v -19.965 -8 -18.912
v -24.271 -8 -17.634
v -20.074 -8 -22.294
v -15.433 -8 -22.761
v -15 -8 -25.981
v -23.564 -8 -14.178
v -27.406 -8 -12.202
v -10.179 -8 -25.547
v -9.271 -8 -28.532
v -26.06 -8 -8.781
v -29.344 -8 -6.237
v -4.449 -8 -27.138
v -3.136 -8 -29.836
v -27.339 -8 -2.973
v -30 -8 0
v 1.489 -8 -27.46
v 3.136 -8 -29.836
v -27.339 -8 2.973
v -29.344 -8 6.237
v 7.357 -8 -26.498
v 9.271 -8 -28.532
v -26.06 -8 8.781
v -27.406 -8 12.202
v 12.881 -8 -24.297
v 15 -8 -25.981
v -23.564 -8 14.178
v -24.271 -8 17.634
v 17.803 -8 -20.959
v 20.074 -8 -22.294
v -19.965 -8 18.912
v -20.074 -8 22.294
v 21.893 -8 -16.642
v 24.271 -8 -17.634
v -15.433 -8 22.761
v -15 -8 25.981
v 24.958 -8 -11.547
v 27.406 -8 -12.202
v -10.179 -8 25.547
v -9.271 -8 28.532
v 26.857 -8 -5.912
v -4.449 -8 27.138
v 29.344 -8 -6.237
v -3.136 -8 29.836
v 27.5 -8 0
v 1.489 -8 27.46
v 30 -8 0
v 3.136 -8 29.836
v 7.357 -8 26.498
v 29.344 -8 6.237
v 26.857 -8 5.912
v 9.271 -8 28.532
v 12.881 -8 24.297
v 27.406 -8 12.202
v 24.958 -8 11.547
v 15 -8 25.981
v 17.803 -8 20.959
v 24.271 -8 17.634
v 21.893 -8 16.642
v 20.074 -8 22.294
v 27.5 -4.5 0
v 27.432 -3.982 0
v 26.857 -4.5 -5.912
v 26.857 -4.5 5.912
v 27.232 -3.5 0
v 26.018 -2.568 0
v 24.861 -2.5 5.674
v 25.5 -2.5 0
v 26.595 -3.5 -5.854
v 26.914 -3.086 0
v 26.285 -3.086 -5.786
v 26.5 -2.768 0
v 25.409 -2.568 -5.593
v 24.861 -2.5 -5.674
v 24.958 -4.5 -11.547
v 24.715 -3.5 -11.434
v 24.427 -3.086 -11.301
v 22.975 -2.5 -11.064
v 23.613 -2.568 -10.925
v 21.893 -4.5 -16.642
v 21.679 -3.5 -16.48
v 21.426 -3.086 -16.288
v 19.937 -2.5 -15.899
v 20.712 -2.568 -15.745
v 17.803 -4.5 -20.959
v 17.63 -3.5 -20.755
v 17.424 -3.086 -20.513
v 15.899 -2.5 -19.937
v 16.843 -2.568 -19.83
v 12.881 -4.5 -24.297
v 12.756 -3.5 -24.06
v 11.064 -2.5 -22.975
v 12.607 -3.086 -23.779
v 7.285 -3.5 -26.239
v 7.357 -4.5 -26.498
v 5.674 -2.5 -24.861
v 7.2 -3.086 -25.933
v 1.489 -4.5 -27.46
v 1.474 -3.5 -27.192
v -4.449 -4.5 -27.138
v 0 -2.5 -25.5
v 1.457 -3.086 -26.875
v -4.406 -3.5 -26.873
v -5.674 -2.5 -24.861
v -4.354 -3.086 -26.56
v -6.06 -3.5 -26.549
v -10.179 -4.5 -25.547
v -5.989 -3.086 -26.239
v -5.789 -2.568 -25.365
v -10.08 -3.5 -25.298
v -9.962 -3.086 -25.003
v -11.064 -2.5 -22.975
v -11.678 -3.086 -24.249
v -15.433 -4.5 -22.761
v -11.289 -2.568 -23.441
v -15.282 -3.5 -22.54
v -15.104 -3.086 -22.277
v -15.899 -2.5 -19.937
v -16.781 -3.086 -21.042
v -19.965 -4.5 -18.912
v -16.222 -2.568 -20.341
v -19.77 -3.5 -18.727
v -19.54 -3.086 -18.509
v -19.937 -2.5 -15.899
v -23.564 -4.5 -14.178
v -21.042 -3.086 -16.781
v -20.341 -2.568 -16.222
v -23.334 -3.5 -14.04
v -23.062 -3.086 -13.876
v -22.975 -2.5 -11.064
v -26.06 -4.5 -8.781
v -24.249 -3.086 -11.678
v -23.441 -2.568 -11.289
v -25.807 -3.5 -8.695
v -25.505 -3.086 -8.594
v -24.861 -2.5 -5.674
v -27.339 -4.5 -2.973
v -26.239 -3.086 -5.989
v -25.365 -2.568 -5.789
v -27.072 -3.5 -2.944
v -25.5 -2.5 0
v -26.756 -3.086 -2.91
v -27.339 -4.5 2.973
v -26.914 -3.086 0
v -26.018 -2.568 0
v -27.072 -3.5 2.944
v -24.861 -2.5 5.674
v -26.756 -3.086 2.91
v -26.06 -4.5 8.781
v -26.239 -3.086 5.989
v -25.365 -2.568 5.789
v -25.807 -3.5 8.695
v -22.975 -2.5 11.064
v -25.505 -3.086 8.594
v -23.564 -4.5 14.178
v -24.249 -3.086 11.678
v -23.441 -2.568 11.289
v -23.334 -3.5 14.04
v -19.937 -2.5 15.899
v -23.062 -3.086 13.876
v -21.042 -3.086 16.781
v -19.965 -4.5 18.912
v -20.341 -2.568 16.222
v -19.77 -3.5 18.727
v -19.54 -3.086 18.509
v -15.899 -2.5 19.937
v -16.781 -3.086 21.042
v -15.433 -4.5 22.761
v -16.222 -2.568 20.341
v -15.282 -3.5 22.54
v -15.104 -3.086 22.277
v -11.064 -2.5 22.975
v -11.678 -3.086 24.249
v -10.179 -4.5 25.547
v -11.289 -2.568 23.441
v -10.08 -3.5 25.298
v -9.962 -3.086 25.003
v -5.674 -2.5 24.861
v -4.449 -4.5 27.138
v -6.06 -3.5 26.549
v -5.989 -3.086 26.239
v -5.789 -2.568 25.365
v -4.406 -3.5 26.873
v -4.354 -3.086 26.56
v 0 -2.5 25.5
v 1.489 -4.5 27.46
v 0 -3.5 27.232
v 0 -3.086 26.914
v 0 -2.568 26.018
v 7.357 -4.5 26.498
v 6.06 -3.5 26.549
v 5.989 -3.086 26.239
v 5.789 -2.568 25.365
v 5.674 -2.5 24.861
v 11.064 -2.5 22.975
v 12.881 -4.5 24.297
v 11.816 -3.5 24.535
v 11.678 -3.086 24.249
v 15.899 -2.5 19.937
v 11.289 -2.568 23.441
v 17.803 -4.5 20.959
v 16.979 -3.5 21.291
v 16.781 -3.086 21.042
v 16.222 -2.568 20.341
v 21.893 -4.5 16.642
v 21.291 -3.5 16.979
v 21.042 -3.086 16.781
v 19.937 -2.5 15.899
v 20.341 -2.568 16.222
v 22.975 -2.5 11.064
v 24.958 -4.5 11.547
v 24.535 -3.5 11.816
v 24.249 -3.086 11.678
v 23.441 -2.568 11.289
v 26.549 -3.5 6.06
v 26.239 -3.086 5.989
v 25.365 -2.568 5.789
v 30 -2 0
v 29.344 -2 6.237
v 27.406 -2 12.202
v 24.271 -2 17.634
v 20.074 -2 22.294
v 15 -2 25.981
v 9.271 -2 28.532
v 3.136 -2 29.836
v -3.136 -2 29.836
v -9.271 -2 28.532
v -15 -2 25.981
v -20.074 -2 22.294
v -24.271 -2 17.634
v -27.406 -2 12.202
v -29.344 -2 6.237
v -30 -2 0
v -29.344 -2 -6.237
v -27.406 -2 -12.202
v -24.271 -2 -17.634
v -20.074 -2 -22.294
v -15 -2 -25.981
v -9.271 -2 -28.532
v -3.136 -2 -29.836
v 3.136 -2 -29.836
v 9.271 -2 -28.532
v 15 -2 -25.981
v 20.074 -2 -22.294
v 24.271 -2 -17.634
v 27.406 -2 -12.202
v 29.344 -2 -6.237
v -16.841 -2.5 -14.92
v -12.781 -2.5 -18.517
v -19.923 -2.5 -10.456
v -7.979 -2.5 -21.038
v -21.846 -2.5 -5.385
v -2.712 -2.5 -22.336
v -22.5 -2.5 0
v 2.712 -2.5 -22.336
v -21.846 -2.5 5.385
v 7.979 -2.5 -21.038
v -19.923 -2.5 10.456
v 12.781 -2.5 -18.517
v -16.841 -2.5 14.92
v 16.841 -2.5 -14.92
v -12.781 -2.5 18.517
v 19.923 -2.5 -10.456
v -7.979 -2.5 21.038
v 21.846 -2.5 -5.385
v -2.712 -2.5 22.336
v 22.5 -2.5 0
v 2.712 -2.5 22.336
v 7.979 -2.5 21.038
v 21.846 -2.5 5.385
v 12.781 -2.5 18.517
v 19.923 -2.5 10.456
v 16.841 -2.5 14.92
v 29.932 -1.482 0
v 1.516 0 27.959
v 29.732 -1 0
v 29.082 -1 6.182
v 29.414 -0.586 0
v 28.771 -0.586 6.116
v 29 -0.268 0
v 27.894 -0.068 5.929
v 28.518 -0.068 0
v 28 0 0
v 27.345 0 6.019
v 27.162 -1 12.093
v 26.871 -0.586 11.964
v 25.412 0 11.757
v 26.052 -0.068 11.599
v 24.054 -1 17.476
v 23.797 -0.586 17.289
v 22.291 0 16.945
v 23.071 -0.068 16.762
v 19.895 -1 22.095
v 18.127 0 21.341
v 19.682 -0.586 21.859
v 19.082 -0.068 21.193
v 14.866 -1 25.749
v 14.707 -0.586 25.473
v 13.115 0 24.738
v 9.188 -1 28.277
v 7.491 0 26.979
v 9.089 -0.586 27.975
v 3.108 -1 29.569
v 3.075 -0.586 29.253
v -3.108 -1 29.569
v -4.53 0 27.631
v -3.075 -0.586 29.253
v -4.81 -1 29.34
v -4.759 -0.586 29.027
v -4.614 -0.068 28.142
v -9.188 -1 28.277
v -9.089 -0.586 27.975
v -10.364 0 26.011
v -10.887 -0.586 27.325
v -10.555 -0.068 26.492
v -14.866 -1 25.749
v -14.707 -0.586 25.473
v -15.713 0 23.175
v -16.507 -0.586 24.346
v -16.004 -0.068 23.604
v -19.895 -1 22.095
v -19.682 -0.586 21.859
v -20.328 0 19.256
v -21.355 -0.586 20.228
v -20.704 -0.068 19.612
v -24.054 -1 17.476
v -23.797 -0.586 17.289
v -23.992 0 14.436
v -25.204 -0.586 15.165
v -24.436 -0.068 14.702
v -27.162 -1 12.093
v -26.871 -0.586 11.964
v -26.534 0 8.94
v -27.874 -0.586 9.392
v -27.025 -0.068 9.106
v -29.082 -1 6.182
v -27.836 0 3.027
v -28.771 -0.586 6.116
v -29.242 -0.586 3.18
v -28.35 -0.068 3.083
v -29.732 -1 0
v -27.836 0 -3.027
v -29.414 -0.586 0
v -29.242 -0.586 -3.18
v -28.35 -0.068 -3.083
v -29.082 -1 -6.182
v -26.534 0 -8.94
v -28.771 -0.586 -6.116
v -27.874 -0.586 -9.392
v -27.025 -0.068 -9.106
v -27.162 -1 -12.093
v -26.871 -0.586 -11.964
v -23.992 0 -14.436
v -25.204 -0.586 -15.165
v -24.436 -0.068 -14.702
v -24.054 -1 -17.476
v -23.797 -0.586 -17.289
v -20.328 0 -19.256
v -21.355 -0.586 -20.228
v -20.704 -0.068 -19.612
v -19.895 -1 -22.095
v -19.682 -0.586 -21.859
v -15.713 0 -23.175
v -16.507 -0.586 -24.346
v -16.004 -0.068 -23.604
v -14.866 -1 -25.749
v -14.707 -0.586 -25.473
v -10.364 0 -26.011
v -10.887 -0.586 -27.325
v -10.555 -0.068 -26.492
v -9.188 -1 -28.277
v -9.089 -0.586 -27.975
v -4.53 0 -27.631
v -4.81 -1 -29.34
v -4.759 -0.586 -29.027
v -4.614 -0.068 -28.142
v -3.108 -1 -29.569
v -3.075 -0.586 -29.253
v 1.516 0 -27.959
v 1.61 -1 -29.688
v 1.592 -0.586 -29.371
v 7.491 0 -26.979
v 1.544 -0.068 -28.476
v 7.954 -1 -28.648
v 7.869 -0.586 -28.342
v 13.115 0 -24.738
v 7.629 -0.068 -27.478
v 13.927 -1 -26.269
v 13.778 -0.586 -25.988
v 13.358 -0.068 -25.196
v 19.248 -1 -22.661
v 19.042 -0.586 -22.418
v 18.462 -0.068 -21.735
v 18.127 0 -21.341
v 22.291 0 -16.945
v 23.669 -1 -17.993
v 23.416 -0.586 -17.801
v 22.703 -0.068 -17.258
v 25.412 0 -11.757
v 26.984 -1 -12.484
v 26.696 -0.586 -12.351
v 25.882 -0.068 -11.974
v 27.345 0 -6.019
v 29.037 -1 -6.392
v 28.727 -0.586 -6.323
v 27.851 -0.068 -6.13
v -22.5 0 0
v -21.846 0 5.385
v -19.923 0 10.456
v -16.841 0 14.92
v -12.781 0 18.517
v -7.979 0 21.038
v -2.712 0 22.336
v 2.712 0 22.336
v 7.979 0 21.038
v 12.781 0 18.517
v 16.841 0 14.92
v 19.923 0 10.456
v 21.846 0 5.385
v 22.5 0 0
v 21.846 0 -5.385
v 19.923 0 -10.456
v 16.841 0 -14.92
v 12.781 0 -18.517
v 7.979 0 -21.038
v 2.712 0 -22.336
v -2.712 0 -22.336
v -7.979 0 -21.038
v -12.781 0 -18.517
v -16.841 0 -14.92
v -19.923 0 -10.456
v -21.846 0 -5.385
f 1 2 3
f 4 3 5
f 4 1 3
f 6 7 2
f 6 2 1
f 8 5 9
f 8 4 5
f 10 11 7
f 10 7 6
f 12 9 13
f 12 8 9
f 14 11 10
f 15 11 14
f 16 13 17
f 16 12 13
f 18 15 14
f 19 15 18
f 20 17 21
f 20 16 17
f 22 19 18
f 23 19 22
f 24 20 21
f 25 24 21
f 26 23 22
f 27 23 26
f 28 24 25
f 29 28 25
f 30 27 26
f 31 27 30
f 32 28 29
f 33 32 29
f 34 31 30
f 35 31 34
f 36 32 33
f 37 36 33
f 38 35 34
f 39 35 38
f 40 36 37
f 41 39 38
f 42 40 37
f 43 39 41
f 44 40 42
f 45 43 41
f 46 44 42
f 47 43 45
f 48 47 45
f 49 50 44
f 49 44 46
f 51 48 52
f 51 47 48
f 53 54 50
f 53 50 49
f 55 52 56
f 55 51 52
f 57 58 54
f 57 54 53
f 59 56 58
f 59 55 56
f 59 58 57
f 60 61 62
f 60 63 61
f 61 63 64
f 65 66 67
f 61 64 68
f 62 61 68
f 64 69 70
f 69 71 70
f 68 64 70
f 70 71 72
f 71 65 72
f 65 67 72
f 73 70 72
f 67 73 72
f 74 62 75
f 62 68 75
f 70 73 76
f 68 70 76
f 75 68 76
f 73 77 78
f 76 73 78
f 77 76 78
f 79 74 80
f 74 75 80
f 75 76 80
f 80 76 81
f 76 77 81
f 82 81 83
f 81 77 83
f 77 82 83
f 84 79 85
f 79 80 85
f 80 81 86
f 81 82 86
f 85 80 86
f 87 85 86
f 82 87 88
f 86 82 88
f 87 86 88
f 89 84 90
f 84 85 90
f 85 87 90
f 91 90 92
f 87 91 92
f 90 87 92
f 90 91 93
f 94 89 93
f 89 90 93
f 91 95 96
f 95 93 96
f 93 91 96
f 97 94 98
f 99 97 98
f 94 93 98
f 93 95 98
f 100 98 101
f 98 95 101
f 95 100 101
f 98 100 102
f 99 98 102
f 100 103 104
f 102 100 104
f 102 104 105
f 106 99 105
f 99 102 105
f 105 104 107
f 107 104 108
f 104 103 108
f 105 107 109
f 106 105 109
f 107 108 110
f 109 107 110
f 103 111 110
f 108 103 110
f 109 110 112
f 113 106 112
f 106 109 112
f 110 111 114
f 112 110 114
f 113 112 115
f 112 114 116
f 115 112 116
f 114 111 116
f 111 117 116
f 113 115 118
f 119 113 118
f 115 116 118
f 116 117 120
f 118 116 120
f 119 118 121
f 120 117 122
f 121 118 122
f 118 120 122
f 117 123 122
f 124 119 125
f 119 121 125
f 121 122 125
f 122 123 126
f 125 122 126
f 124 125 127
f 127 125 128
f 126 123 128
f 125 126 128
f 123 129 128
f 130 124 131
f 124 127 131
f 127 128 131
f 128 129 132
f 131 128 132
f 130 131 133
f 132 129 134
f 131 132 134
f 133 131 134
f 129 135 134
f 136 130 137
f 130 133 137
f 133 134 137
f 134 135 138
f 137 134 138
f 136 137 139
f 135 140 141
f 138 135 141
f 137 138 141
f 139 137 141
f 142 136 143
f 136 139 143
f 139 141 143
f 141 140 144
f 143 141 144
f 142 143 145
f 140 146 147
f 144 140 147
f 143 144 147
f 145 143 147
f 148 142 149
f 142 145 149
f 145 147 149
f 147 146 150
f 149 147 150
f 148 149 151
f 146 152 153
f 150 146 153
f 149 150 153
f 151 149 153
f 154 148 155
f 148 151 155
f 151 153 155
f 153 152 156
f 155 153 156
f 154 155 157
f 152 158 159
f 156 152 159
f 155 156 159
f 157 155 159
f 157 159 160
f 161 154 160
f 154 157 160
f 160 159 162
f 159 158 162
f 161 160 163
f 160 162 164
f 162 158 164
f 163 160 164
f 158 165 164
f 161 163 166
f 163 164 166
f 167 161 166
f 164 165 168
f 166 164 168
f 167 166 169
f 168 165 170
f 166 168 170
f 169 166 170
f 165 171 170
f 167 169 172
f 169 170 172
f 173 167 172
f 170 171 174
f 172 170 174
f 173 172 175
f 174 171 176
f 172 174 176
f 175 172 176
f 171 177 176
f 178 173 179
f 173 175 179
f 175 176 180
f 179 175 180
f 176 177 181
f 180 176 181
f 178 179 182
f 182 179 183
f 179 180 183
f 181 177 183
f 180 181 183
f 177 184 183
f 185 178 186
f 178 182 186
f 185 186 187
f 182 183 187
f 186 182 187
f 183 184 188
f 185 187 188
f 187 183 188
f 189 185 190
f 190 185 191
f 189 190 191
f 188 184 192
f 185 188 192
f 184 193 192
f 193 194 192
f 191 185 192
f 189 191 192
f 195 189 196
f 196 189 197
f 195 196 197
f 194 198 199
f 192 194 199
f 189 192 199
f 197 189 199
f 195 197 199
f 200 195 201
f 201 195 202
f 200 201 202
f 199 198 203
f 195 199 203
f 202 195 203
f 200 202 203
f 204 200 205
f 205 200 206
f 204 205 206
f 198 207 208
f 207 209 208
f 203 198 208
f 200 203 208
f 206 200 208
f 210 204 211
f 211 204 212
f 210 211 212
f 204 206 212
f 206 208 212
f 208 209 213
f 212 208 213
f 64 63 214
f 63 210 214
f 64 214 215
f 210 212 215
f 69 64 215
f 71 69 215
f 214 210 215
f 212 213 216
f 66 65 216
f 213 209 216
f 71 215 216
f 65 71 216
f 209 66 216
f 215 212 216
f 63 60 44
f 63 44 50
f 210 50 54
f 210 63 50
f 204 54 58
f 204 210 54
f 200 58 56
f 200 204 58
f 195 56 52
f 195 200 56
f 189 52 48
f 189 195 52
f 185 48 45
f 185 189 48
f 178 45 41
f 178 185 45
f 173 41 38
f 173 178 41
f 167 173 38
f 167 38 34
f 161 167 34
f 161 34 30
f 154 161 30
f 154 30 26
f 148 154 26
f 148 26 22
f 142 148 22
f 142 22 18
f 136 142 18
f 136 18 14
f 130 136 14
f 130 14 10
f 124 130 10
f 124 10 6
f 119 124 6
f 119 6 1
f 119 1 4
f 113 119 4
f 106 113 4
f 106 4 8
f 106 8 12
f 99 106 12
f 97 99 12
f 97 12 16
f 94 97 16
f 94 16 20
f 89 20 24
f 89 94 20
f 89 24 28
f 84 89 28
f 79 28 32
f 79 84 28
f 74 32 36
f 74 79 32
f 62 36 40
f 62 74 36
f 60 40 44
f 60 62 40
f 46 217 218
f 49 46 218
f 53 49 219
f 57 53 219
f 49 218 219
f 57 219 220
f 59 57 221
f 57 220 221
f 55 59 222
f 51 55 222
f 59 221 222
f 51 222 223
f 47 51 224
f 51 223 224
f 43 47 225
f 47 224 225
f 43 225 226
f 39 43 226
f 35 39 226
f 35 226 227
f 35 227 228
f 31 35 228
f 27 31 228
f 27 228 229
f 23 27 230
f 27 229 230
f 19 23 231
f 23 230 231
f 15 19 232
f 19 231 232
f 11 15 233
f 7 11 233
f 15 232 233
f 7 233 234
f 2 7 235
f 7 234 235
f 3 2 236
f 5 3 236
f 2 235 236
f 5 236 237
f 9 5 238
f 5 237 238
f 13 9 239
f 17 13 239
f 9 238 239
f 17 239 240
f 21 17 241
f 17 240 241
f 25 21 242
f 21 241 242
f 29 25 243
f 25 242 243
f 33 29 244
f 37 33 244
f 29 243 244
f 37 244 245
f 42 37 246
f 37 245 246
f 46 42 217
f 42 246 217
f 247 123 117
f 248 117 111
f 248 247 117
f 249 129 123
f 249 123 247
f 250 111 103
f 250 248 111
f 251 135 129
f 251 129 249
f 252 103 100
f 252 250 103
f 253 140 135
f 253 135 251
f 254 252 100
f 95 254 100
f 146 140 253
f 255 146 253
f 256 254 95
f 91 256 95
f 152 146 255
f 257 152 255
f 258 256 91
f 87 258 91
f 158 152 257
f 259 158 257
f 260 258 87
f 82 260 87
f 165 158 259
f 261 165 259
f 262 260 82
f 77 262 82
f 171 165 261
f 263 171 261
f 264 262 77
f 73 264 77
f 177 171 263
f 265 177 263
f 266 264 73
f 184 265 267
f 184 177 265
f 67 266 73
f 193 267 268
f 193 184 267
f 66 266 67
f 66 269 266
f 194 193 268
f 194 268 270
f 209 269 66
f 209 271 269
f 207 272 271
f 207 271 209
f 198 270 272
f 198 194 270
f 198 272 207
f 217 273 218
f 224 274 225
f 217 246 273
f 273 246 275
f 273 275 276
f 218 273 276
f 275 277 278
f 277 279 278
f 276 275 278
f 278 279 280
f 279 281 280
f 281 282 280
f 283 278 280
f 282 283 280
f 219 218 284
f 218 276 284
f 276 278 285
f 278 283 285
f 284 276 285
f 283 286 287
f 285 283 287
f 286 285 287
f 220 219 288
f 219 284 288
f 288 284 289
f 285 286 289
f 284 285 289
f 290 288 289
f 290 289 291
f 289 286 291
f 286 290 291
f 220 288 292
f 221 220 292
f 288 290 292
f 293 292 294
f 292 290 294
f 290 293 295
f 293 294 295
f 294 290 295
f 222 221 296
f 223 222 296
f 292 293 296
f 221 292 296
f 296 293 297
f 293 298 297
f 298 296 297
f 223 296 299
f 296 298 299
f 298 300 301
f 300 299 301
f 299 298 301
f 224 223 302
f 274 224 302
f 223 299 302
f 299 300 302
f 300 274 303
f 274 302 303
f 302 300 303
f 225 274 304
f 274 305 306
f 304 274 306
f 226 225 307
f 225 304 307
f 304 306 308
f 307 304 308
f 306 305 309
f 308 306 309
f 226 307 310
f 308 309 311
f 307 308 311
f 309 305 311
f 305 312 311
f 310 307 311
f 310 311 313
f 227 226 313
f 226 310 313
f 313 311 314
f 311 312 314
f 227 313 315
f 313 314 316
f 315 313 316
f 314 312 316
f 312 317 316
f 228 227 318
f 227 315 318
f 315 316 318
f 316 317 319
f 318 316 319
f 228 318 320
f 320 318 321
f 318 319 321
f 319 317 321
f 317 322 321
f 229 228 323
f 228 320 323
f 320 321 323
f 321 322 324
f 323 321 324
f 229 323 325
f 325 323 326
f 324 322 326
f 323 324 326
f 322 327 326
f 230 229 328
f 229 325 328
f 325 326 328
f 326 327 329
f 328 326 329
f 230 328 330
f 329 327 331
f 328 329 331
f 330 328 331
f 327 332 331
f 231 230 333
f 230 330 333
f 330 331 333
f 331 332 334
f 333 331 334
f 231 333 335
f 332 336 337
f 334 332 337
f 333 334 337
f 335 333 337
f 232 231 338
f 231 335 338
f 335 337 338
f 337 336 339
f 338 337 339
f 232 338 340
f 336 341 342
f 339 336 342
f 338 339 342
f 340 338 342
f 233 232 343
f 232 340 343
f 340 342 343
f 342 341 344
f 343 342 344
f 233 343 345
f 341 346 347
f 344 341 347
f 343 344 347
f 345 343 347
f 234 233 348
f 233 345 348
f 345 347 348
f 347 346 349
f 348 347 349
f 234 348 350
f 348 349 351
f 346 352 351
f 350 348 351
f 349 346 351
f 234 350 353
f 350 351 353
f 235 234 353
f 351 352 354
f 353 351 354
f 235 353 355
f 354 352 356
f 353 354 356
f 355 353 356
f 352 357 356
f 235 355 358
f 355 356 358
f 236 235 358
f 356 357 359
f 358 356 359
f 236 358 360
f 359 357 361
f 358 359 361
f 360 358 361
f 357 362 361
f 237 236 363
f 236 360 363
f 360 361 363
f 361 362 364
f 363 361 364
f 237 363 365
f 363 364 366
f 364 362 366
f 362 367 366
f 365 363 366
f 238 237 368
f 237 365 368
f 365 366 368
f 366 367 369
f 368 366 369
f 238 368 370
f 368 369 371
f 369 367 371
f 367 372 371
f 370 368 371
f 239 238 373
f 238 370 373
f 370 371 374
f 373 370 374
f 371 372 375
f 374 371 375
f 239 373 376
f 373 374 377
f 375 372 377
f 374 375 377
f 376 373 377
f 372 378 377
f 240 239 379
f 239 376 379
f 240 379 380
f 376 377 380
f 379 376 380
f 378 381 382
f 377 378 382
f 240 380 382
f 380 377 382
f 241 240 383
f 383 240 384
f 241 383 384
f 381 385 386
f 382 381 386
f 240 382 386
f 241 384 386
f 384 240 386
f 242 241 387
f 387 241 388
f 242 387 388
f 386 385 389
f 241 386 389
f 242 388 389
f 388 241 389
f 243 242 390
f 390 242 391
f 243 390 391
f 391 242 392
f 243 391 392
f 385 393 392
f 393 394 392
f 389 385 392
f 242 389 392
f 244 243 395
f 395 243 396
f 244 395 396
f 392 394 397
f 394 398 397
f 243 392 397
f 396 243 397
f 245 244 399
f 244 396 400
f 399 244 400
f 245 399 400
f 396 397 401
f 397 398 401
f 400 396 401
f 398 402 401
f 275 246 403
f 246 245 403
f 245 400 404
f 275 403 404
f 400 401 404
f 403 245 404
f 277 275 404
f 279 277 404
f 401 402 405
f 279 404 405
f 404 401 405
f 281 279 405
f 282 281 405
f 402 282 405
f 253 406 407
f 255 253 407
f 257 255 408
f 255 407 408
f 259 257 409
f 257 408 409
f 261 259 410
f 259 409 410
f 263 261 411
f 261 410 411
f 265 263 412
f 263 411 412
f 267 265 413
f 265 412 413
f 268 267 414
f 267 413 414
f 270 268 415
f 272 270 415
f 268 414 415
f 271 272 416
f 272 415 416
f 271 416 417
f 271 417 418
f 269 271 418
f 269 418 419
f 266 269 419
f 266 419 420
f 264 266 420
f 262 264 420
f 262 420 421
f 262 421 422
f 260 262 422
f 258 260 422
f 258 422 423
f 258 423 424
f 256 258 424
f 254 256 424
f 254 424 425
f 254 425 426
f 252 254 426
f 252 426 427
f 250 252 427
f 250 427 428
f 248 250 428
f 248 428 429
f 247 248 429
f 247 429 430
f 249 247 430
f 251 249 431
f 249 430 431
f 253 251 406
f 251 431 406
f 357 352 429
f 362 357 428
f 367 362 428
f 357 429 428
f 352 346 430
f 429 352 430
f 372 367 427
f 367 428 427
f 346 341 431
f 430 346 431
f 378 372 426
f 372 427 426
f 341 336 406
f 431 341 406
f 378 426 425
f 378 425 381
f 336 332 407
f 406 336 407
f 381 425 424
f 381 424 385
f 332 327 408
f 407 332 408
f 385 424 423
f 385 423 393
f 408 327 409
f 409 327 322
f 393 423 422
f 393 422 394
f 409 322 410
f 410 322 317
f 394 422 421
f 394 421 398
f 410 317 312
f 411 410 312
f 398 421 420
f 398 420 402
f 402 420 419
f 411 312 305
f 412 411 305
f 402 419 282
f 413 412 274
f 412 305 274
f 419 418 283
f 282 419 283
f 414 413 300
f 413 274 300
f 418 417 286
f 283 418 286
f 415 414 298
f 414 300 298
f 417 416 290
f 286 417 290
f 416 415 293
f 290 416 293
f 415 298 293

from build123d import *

# Parameters (mm, degrees)
F0_R     = 30
F1_DEPTH = 8
F2_T     = -2.5
F3_R     = 22.5
F4_DEPTH = 25
F5_R     = 2
F6_R     = 2


with BuildPart() as f1:
    # F0 (on Front) → F1 (new body)
    with BuildSketch(Plane.XZ):
        Circle(F0_R)
    extrude(amount=F1_DEPTH)

    # F2
    f2_openings = [f1.faces().sort_by_distance(p)[0] for p in [
        (0, -8, 0),
    ]]
    offset(amount=F2_T, openings=f2_openings)

    # F3 (on face) → F4 (cut)
    with BuildSketch(Plane(origin=(0, 0, 0), x_dir=(-1, 0, 0), z_dir=(0, 1, 0))):
        Circle(F3_R)
    extrude(amount=-F4_DEPTH, mode=Mode.SUBTRACT)

    # F5
    f5_edges = [f1.edges().sort_by_distance(p)[0] for p in [
        (-30, 0, 0),
    ]]
    fillet(f5_edges, radius=F5_R)

    # F6
    f6_edges = [f1.edges().sort_by_distance(p)[0] for p in [
        (-27.5, -2.5, 0),
    ]]
    fillet(f6_edges, radius=F6_R)


solid = f1.part
